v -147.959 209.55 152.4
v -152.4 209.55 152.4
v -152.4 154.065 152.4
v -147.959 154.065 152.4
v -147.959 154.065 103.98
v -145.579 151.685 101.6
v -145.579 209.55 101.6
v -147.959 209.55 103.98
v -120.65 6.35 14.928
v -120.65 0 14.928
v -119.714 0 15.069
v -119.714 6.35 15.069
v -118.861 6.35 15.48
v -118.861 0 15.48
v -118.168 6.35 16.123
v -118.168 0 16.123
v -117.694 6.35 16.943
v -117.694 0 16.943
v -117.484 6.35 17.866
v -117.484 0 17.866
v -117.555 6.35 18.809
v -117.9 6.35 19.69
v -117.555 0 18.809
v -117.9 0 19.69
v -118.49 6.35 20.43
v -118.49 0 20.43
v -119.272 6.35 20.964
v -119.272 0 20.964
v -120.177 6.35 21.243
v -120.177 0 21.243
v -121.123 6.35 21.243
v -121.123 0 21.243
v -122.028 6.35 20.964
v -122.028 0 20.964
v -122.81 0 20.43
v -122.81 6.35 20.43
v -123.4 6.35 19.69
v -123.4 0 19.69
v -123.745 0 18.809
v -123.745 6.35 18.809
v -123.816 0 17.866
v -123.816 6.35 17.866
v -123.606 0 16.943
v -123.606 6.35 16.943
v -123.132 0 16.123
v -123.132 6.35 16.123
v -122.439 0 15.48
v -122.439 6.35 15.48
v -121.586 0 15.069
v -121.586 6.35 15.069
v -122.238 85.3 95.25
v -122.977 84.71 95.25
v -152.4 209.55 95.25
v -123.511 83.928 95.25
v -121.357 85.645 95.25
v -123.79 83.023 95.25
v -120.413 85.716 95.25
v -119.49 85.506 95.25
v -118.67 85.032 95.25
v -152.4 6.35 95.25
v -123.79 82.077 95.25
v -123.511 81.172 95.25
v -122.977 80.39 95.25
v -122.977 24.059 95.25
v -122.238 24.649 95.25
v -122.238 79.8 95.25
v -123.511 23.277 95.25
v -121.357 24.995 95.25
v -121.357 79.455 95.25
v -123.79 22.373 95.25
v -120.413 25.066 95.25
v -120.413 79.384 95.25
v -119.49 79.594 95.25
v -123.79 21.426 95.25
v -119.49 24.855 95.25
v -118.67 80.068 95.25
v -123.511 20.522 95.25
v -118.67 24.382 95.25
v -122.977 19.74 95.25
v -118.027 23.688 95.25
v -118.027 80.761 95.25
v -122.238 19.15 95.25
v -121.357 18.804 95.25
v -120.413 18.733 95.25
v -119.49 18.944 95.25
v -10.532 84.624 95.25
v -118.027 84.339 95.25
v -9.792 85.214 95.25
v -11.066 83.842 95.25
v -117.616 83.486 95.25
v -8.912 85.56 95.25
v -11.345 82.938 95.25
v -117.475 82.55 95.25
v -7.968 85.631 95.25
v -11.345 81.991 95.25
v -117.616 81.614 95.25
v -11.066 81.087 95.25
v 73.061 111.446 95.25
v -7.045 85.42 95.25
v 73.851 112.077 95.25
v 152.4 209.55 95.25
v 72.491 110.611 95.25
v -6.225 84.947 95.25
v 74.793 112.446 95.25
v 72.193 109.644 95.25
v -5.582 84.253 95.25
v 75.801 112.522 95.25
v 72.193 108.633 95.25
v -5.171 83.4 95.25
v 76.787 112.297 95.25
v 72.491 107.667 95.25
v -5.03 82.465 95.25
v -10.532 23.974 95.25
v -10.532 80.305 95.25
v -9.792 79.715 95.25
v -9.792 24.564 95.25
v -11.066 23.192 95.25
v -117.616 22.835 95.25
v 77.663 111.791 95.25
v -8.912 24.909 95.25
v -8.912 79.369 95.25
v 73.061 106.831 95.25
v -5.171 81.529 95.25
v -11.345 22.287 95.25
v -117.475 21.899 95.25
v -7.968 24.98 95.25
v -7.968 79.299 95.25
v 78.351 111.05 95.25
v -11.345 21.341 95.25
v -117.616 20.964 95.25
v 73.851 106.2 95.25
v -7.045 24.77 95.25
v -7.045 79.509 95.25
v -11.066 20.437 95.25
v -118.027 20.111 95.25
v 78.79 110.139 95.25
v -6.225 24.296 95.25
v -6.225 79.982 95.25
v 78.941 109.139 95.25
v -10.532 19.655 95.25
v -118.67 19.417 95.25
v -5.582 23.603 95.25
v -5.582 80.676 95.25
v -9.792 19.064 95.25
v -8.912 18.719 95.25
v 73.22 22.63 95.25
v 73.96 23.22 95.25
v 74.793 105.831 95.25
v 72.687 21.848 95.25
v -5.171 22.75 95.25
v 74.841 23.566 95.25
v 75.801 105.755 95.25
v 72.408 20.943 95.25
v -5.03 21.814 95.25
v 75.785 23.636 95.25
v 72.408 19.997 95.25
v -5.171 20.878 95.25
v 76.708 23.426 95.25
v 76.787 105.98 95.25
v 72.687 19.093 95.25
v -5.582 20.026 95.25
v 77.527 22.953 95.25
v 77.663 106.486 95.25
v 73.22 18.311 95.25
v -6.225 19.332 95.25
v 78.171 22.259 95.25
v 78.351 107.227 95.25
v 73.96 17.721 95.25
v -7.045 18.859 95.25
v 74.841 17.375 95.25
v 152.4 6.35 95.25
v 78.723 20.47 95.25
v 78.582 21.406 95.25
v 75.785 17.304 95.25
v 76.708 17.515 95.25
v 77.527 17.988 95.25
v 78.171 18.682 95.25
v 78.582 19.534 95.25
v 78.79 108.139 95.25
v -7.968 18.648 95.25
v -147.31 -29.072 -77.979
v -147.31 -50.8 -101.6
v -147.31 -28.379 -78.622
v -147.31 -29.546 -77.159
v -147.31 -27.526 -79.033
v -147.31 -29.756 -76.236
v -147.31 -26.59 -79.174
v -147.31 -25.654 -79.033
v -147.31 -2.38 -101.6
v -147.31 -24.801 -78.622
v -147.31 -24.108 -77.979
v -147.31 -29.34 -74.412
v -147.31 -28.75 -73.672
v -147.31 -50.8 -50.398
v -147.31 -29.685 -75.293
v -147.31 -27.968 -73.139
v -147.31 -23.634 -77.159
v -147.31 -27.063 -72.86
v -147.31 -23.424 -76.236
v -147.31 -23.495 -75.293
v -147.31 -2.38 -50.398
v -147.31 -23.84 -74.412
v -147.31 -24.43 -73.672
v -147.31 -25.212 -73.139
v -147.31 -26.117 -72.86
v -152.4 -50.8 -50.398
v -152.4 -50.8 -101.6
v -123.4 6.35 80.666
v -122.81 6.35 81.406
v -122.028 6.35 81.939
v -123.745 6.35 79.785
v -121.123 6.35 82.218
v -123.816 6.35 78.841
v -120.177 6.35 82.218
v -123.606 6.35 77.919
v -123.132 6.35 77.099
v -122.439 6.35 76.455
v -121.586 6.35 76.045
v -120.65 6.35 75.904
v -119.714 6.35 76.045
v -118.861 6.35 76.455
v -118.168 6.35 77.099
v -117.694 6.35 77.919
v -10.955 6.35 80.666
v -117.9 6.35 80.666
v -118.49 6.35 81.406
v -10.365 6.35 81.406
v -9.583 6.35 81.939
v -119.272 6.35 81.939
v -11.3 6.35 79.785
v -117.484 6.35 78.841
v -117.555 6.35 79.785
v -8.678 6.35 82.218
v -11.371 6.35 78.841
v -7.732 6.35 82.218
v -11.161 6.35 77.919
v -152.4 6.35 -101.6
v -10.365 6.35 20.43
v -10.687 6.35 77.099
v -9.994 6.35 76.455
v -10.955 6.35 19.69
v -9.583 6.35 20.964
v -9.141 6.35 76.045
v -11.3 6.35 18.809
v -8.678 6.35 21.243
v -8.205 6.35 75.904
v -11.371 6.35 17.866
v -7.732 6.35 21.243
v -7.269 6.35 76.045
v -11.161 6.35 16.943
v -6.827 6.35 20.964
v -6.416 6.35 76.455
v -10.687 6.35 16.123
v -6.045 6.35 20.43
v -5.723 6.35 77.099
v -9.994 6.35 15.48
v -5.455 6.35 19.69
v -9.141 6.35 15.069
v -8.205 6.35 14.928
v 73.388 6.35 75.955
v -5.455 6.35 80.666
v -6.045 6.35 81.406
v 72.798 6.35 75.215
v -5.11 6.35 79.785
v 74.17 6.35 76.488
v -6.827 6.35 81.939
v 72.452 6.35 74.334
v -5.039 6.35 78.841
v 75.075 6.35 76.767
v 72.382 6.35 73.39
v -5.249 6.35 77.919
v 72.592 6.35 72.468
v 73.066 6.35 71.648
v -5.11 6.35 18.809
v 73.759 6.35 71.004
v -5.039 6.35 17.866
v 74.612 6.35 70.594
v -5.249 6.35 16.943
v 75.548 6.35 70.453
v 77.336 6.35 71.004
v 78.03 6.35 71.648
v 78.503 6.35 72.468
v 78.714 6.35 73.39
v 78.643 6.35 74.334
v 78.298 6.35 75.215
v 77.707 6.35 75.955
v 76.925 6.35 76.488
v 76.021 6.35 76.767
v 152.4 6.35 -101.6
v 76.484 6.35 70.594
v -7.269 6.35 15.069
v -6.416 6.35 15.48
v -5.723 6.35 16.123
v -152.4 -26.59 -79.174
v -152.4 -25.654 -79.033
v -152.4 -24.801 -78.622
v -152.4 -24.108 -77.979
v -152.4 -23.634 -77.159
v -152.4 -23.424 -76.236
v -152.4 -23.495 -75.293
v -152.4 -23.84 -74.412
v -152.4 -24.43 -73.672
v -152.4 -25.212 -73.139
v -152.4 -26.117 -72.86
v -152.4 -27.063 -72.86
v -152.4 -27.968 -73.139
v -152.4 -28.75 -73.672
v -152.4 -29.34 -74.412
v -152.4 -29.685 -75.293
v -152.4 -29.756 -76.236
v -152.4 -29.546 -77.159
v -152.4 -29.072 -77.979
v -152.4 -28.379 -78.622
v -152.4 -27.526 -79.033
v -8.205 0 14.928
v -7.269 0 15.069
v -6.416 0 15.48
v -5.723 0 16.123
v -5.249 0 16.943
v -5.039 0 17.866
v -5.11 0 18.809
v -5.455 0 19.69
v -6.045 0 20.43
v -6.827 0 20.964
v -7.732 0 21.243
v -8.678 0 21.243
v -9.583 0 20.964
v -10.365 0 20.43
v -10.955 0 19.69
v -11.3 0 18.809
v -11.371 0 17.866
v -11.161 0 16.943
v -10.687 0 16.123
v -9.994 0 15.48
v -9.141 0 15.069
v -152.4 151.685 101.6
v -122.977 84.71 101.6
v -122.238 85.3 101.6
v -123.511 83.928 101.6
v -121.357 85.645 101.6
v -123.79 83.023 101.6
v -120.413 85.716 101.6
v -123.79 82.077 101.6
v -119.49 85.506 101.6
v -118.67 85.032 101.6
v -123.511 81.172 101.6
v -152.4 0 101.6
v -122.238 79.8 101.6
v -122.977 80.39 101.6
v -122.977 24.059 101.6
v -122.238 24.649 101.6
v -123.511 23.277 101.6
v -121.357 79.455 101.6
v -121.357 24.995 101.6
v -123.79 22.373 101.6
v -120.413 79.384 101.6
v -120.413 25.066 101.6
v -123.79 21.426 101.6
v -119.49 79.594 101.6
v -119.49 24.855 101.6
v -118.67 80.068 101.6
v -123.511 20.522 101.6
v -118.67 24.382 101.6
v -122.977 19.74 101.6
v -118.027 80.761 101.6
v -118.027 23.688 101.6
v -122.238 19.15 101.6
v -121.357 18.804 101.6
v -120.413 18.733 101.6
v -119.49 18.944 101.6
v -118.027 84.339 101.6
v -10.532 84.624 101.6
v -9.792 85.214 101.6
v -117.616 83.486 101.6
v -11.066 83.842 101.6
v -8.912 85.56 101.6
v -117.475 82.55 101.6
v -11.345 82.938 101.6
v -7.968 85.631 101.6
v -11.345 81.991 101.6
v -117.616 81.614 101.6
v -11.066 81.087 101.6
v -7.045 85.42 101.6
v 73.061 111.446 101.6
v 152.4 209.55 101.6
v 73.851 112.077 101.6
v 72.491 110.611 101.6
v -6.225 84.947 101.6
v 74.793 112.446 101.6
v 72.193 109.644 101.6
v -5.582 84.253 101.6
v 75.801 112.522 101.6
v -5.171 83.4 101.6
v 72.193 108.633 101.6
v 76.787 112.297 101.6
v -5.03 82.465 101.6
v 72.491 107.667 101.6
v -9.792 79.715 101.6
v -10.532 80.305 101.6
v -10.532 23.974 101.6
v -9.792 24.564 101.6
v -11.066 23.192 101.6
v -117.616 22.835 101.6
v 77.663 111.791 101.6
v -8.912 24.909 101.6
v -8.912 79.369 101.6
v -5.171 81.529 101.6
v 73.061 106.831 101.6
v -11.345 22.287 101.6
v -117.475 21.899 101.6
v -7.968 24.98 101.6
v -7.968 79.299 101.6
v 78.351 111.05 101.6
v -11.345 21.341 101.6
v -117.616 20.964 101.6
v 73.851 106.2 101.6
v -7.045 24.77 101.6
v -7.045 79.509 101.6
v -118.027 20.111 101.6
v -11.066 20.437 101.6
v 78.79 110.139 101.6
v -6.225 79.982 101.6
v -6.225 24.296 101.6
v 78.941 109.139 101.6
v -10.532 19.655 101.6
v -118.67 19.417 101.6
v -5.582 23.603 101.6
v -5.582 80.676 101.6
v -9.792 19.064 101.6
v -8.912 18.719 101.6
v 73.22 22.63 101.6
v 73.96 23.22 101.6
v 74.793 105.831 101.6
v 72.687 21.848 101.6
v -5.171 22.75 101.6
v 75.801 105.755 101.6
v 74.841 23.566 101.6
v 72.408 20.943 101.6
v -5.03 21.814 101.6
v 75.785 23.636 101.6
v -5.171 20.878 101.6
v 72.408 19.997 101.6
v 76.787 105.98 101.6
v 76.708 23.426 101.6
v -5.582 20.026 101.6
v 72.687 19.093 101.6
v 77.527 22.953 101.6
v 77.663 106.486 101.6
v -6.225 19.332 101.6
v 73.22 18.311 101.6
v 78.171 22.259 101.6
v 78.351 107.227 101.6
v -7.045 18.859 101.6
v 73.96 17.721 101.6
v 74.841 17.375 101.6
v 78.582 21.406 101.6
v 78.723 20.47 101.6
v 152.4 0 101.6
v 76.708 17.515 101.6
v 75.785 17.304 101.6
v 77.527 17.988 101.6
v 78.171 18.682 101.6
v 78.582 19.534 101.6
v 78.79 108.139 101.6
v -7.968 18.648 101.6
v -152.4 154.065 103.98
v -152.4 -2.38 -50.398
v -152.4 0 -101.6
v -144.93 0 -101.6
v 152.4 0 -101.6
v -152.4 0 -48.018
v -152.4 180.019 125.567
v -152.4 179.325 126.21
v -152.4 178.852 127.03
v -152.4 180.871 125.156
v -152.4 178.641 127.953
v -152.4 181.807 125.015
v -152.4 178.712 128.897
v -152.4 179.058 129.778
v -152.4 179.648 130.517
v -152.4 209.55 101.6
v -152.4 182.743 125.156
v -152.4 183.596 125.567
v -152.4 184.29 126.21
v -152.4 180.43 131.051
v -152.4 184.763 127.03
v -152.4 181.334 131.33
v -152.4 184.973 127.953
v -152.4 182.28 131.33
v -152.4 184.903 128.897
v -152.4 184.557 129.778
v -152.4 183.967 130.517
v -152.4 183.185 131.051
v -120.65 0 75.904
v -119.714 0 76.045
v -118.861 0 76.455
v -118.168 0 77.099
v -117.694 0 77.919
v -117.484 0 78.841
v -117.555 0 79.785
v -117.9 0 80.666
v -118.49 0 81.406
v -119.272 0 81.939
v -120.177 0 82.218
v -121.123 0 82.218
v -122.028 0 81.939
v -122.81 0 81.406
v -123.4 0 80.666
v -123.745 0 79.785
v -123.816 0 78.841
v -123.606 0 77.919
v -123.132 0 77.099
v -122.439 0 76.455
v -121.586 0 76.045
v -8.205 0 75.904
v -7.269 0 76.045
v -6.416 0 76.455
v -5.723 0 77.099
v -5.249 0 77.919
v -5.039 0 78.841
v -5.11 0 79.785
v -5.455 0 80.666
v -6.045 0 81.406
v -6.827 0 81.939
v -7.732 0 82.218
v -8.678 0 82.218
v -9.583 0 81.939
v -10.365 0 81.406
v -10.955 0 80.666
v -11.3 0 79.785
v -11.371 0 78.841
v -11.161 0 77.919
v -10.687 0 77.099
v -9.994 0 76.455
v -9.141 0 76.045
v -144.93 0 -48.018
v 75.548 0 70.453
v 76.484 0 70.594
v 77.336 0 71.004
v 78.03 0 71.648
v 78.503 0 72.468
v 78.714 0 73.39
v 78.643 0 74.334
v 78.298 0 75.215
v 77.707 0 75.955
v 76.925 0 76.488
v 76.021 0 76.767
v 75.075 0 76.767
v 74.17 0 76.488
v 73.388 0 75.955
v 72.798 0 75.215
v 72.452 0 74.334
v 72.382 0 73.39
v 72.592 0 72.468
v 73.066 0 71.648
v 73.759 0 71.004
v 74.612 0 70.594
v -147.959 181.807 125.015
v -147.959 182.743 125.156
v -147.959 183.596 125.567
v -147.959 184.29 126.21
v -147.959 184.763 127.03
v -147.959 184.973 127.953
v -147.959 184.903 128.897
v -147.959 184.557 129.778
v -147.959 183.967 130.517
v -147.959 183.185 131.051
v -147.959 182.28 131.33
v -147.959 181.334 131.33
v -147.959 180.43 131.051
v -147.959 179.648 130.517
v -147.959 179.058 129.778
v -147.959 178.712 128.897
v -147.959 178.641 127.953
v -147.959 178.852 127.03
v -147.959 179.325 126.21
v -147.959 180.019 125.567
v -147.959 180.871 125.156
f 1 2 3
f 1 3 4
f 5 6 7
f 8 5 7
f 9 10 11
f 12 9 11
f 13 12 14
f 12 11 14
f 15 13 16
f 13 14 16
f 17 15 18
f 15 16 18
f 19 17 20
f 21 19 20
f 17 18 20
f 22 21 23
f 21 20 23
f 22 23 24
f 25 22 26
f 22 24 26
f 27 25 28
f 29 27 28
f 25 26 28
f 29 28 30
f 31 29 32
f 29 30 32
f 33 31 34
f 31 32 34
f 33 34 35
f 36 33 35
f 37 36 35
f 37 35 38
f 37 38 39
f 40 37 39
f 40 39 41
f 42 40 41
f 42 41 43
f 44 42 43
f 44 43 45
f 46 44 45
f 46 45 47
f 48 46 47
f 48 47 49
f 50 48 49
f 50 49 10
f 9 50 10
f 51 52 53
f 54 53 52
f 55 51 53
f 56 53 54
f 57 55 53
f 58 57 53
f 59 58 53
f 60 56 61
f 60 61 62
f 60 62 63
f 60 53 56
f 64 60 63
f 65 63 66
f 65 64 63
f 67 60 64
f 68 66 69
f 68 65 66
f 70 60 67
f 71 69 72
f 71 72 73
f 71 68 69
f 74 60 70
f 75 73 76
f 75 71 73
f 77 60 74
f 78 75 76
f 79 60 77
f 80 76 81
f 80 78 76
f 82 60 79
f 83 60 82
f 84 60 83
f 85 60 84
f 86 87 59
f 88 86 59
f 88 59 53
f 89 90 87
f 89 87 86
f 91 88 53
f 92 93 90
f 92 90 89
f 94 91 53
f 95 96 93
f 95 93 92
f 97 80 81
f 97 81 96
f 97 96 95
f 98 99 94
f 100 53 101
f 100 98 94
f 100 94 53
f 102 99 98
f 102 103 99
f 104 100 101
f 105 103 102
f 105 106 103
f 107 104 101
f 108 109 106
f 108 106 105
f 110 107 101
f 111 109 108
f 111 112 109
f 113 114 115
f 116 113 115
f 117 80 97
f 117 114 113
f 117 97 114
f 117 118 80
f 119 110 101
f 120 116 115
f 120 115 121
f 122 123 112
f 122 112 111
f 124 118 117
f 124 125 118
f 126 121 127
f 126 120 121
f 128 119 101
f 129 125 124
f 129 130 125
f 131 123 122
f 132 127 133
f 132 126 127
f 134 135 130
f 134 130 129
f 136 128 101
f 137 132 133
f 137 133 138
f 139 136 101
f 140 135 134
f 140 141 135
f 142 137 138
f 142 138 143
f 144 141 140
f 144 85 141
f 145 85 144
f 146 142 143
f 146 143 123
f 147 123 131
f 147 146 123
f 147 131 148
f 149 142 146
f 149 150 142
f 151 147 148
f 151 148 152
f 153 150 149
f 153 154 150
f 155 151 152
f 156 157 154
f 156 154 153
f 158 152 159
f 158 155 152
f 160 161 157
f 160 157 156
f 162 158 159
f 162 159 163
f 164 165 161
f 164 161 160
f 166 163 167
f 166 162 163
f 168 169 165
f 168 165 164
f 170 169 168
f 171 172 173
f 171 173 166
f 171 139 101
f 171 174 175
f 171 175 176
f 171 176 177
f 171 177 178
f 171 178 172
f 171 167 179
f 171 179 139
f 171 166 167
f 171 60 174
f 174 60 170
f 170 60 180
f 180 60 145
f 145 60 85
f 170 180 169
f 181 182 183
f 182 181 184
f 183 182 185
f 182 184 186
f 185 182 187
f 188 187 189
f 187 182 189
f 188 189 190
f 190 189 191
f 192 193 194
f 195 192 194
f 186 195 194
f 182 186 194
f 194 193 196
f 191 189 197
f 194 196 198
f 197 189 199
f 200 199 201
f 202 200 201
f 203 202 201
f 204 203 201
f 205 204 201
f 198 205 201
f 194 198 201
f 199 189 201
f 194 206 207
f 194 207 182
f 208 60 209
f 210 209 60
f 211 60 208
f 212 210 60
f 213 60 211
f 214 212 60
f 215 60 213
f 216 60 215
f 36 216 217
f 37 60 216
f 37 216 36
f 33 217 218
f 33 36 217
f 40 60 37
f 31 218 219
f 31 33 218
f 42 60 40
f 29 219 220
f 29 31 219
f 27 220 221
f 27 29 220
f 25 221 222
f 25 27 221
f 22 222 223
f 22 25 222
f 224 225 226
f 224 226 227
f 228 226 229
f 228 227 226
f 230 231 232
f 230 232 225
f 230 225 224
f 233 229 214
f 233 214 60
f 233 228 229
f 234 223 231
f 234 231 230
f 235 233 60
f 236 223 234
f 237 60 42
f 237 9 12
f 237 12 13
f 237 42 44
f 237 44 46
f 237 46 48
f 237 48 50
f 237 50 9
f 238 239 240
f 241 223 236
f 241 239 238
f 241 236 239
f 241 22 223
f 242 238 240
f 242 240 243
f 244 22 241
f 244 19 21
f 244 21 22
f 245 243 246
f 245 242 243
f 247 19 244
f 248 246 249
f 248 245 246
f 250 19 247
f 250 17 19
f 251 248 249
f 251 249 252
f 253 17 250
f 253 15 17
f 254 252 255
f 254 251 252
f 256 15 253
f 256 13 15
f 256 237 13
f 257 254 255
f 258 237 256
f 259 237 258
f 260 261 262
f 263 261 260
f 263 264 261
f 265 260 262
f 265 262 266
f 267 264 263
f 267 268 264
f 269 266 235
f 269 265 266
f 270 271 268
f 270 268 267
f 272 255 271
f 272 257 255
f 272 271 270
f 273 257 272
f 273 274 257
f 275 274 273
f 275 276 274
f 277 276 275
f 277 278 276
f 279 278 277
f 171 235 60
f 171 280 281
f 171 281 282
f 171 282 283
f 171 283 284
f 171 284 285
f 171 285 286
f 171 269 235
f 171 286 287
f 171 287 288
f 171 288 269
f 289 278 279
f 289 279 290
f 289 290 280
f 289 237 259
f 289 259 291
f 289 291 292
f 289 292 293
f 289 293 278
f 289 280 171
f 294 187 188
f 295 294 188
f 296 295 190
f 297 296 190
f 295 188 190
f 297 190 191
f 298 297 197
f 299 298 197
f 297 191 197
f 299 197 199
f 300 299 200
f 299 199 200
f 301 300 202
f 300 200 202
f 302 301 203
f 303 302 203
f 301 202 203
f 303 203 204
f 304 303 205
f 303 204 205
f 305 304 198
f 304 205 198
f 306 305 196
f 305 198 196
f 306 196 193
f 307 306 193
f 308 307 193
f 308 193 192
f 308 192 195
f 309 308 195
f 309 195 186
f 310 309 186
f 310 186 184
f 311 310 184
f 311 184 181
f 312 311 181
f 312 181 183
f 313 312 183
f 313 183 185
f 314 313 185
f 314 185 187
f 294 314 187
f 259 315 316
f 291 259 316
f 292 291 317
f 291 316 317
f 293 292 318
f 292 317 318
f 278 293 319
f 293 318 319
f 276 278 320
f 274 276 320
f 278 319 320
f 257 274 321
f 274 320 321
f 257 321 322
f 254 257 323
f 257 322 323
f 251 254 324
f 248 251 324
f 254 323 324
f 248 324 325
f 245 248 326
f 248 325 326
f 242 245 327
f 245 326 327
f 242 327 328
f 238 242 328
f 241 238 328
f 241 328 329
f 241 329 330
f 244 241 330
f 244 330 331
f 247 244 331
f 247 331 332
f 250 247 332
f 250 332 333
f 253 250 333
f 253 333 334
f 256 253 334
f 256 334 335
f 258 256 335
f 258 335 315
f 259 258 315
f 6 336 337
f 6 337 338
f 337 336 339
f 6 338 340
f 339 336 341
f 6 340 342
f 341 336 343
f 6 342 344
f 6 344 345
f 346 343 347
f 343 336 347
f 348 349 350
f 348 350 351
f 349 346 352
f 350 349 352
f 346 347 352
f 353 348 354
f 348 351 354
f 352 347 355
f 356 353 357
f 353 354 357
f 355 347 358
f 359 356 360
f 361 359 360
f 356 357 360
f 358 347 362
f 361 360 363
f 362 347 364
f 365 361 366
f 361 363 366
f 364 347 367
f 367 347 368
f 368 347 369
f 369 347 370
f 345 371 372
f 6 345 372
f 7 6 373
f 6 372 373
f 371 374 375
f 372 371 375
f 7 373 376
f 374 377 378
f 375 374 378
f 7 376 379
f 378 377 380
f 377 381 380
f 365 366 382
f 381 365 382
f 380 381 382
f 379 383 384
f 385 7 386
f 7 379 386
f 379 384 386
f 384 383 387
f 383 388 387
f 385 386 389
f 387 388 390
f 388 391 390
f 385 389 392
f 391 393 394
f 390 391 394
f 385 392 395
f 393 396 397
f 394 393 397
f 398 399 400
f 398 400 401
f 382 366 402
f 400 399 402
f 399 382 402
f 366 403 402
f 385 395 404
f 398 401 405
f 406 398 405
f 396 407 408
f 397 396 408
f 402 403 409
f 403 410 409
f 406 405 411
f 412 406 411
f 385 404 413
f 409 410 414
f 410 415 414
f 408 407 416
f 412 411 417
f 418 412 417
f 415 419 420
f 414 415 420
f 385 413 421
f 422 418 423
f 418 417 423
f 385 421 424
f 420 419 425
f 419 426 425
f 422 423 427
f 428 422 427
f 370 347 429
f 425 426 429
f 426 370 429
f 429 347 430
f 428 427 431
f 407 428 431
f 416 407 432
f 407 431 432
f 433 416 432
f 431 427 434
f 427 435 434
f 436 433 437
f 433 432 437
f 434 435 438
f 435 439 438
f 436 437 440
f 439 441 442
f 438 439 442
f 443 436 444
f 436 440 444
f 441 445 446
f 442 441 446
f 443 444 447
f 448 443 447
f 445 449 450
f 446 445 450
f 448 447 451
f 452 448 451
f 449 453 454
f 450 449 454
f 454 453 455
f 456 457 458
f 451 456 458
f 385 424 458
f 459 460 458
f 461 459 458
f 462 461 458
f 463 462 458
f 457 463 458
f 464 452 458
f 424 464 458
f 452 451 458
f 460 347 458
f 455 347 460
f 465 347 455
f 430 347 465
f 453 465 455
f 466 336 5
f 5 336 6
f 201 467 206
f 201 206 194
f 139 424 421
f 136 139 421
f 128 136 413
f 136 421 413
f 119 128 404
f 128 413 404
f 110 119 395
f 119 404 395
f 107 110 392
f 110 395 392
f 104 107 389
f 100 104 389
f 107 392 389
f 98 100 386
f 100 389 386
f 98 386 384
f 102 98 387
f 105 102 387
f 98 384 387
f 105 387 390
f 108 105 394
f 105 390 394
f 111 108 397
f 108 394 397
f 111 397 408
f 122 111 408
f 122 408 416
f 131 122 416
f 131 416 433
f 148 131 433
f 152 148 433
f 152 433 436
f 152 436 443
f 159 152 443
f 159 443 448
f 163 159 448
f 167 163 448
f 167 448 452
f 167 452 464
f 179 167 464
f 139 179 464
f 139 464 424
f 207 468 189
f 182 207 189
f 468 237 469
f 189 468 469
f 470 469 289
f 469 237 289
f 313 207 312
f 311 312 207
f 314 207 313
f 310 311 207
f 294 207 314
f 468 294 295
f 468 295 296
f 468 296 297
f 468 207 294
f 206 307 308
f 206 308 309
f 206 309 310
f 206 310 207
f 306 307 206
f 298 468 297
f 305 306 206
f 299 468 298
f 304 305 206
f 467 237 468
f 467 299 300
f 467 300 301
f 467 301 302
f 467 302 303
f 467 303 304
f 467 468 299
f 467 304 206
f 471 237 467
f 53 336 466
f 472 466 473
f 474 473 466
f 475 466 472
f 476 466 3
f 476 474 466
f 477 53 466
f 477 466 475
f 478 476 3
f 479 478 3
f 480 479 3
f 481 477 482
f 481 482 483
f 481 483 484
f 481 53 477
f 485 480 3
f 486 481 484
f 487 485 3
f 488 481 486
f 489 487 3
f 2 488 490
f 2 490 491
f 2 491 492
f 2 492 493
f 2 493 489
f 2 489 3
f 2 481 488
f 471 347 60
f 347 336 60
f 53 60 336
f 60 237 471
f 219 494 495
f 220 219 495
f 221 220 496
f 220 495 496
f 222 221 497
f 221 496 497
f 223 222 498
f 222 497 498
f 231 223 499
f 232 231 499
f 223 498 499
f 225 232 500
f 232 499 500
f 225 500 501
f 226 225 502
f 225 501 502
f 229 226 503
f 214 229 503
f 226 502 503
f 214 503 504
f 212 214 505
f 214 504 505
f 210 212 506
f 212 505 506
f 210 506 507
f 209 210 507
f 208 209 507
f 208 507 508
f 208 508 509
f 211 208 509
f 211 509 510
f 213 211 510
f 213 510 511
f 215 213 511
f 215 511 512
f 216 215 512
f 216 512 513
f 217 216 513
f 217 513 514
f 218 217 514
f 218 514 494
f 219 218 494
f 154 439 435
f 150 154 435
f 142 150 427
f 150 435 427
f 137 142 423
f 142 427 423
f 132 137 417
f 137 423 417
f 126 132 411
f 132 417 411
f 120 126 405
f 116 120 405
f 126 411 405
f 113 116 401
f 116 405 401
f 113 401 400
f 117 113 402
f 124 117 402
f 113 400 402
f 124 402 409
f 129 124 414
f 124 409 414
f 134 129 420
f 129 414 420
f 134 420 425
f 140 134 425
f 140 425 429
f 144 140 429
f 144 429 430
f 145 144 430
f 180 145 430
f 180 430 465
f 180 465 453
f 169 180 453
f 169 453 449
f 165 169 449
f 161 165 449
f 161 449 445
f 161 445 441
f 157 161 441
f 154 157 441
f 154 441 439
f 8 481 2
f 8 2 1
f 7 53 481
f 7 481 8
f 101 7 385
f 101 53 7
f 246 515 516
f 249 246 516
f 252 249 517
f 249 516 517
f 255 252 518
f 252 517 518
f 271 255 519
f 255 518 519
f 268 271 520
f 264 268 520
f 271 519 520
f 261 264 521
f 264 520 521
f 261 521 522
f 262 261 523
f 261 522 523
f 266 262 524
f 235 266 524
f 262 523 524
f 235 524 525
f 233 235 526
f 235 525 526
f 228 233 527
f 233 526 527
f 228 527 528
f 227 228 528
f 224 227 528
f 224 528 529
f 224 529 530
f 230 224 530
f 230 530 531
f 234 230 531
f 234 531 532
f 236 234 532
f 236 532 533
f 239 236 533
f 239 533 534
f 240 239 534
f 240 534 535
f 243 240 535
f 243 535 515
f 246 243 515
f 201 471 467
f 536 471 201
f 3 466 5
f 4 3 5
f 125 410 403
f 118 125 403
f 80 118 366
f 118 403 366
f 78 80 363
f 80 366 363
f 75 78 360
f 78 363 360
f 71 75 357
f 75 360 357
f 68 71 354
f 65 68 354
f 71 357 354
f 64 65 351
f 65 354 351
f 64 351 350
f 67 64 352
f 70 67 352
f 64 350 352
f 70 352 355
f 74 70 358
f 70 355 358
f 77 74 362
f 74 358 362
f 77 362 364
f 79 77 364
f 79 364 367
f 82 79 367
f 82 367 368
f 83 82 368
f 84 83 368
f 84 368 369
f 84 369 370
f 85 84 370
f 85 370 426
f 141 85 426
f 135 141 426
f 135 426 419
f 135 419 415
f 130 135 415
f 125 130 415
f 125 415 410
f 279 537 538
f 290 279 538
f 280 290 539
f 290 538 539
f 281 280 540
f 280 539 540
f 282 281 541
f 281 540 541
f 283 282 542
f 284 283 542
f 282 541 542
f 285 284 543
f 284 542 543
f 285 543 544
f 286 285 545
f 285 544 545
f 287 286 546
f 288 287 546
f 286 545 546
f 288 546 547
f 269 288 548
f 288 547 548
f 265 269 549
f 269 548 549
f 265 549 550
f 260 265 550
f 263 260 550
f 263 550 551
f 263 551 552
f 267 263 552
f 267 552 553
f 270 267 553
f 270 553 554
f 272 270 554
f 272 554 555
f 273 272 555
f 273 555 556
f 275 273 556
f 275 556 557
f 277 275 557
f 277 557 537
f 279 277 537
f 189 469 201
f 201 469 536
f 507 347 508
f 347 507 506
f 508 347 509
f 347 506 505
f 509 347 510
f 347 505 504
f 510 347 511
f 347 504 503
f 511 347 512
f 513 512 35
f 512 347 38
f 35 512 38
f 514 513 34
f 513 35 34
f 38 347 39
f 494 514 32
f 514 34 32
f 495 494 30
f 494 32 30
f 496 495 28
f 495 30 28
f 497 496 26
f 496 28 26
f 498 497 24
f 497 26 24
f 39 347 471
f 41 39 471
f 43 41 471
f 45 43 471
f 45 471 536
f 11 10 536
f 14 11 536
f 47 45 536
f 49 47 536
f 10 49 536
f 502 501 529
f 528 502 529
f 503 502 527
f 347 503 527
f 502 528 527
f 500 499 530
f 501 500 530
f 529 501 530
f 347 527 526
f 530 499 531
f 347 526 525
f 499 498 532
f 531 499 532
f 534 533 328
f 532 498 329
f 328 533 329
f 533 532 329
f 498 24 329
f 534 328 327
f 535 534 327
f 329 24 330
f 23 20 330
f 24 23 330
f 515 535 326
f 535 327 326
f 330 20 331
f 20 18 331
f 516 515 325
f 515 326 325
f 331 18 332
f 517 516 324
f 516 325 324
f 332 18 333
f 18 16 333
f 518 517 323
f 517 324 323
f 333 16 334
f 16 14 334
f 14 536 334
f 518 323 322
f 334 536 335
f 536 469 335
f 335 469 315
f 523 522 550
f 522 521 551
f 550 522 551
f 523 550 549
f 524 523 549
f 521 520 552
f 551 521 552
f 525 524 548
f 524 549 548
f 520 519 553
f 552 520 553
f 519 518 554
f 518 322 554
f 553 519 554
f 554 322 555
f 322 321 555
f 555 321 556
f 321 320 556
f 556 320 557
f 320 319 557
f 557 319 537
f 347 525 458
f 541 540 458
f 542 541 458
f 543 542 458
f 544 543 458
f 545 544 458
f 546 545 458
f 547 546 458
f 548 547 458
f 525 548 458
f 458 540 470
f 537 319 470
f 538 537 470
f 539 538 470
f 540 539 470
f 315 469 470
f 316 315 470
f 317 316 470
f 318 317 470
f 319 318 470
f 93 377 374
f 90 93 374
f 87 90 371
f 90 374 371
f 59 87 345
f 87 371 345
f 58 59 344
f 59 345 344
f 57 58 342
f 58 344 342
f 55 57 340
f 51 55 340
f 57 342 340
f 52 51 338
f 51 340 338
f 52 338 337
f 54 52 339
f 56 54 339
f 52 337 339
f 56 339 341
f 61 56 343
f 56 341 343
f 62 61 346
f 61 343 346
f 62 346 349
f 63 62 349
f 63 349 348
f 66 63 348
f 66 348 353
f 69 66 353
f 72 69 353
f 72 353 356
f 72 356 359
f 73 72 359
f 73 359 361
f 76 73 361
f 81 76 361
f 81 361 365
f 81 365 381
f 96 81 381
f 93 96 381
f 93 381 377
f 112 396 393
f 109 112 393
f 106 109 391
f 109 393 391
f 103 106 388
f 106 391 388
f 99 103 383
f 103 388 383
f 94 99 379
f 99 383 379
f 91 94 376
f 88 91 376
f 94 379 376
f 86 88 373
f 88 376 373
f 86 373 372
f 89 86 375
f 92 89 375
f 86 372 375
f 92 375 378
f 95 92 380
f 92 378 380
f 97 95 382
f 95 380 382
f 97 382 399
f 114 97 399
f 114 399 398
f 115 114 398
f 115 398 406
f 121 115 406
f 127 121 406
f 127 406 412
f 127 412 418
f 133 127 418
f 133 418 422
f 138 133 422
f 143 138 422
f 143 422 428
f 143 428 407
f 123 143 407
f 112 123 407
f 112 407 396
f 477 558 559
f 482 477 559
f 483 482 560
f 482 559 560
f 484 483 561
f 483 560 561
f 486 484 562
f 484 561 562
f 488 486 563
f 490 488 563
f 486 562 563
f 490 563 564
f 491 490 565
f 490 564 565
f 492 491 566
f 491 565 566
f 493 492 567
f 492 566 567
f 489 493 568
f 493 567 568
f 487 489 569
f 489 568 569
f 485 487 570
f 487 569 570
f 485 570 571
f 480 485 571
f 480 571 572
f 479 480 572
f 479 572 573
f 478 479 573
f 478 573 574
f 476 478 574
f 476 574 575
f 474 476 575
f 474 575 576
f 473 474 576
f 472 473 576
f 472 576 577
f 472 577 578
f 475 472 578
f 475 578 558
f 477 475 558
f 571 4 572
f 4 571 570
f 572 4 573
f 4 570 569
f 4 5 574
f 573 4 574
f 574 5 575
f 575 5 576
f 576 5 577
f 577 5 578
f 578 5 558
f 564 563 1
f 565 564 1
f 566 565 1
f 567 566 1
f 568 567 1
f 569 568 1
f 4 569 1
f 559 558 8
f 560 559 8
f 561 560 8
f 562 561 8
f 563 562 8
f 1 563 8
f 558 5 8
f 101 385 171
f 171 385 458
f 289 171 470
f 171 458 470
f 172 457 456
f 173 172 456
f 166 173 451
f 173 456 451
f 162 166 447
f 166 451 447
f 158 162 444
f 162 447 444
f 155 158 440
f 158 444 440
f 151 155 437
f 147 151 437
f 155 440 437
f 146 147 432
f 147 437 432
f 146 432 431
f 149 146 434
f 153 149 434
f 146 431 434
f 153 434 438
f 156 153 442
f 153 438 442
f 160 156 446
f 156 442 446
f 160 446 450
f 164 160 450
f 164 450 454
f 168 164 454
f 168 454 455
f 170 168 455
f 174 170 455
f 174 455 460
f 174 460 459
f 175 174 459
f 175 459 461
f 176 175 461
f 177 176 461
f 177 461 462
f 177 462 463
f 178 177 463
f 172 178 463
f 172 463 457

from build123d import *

# Parameters (mm, degrees)
SKETCH1_W           = 304.8
SKETCH1_H           = 203.2
BOSS_EXTRUDE1_DEPTH = 6.35
SKETCH2_W           = 304.8
SKETCH2_H           = 6.35
BOSS_EXTRUDE2_DEPTH = 40.64
SKETCH3_W           = 20.403275231
SKETCH3_H           = 40.64
CUT_EXTRUDE1_DEPTH  = 325.70549749
SKETCH2_2_W         = 304.8
SKETCH2_2_H         = 6.35
BOSS_EXTRUDE3_DEPTH = 203.2
SKETCH9_R           = 3.175
CUT_EXTRUDE2_DEPTH  = 10.922
SKETCH10_R          = 3.175
SKETCH10_R_2        = 3.392842108
CUT_EXTRUDE3_DEPTH  = 10.922
SKETCH11_W          = 4.440800547
SKETCH11_H          = 55.485459727
BOSS_EXTRUDE7_DEPTH = 50.8
CHAMFER1_SIZE       = 2.38
SKETCH12_W          = 5.089607789
SKETCH12_H          = 51.20183316
BOSS_EXTRUDE8_DEPTH = 50.8
CHAMFER2_SIZE       = 2.38
SKETCH13_R          = 3.175
CUT_EXTRUDE4_DEPTH  = 50.8
SKETCH14_R          = 3.175
CUT_EXTRUDE5_DEPTH  = 50.8


with BuildPart() as part:
    # Sketch1 → Boss-Extrude1 (new body)
    with BuildSketch(Plane(origin=(0, 0, 0), x_dir=(1, 0, 0), z_dir=(0, 1, 0))):
        Rectangle(SKETCH1_W, SKETCH1_H)
    extrude(amount=BOSS_EXTRUDE1_DEPTH)

    # Sketch2 → Boss-Extrude2 (add)
    with BuildSketch(Plane(origin=(0, 6.35, 0), x_dir=(1, 0, 0), z_dir=(0, 1, 0))):
        with Locations((0, -98.425)):
            Rectangle(SKETCH2_W, SKETCH2_H)
    extrude(amount=BOSS_EXTRUDE2_DEPTH)

    # Sketch3 → Cut-Extrude1 (cut, through all)
    with BuildSketch(Plane(origin=(152.4, 0, 0), x_dir=(0, 0, -1), z_dir=(1, 0, 0))):
        with Locations((-91.398362385, 26.67)):
            Rectangle(SKETCH3_W, SKETCH3_H)
        with Locations((91.398362385, 26.67)):
            Rectangle(SKETCH3_W, SKETCH3_H)
    extrude(amount=-CUT_EXTRUDE1_DEPTH, mode=Mode.SUBTRACT)

    # Sketch2<2> → Boss-Extrude3 (add)
    with BuildSketch(Plane(origin=(0, 6.35, 0), x_dir=(1, 0, 0), z_dir=(0, 1, 0))):
        with Locations((0, -98.425)):
            Rectangle(SKETCH2_2_W, SKETCH2_2_H)
    extrude(amount=BOSS_EXTRUDE3_DEPTH)

    # Sketch9 → Cut-Extrude2 (cut)
    with BuildSketch(Plane.XZ):
        with Locations((-120.65, 79.078648077)):
            Circle(SKETCH9_R)
        with Locations((-120.65, 18.102975355)):
            Circle(SKETCH9_R)
        with Locations((-8.205, 79.078648077)):
            Circle(SKETCH9_R)
        with Locations((-8.205, 18.102975355)):
            Circle(SKETCH9_R)
        with Locations((75.547873201, 73.627514031)):
            Circle(SKETCH9_R)
    extrude(amount=-CUT_EXTRUDE2_DEPTH, mode=Mode.SUBTRACT)

    # Sketch10 → Cut-Extrude3 (cut)
    with BuildSketch(Plane.XY.offset(101.6)):
        with Locations((-120.65, 82.55)):
            Circle(SKETCH10_R)
        with Locations((-120.65, 21.89944615)):
            Circle(SKETCH10_R)
        with Locations((-8.205, 82.46463474)):
            Circle(SKETCH10_R)
        with Locations((-8.205, 21.81408089)):
            Circle(SKETCH10_R)
        with Locations((75.547873201, 109.138715406)):
            Circle(SKETCH10_R_2)
        with Locations((75.547873201, 20.470285647)):
            Circle(SKETCH10_R)
    extrude(amount=-CUT_EXTRUDE3_DEPTH, mode=Mode.SUBTRACT)

    # Sketch11 → Boss-Extrude7 (add)
    with BuildSketch(Plane.XY.offset(101.6)):
        with Locations((-150.179599726, 181.807270136)):
            Rectangle(SKETCH11_W, SKETCH11_H)
    extrude(amount=BOSS_EXTRUDE7_DEPTH)

    # Chamfer1
    chamfer1_edges = [part.edges().sort_by_distance(p)[0] for p in [
        (-147.959199453, 181.807270136, 101.6),
        (-150.179599726, 154.064540273, 101.6),
    ]]
    chamfer(chamfer1_edges, length=CHAMFER1_SIZE)

    # Sketch12 → Boss-Extrude8 (add)
    with BuildSketch(Plane.XZ):
        with Locations((-149.855196105, -75.99908342)):
            Rectangle(SKETCH12_W, SKETCH12_H)
    extrude(amount=BOSS_EXTRUDE8_DEPTH)

    # Chamfer2
    chamfer2_edges = [part.edges().sort_by_distance(p)[0] for p in [
        (-149.855196105, 0, -50.39816684),
        (-147.310392211, 0, -75.99908342),
    ]]
    chamfer(chamfer2_edges, length=CHAMFER2_SIZE)

    # Sketch13 → Cut-Extrude4 (cut)
    with BuildSketch(Plane(origin=(-147.310392211, 0, 0), x_dir=(0, 0, -1), z_dir=(1, 0, 0))):
        with Locations((75.99908342, -26.59)):
            Circle(SKETCH13_R)
    extrude(amount=-CUT_EXTRUDE4_DEPTH, mode=Mode.SUBTRACT)

    # Sketch14 → Cut-Extrude5 (cut)
    with BuildSketch(Plane(origin=(-147.959199453, 0, 0), x_dir=(0, 0, -1), z_dir=(1, 0, 0))):
        with Locations((-128.19, 181.807270136)):
            Circle(SKETCH14_R)
    extrude(amount=-CUT_EXTRUDE5_DEPTH, mode=Mode.SUBTRACT)


solid = part.part
